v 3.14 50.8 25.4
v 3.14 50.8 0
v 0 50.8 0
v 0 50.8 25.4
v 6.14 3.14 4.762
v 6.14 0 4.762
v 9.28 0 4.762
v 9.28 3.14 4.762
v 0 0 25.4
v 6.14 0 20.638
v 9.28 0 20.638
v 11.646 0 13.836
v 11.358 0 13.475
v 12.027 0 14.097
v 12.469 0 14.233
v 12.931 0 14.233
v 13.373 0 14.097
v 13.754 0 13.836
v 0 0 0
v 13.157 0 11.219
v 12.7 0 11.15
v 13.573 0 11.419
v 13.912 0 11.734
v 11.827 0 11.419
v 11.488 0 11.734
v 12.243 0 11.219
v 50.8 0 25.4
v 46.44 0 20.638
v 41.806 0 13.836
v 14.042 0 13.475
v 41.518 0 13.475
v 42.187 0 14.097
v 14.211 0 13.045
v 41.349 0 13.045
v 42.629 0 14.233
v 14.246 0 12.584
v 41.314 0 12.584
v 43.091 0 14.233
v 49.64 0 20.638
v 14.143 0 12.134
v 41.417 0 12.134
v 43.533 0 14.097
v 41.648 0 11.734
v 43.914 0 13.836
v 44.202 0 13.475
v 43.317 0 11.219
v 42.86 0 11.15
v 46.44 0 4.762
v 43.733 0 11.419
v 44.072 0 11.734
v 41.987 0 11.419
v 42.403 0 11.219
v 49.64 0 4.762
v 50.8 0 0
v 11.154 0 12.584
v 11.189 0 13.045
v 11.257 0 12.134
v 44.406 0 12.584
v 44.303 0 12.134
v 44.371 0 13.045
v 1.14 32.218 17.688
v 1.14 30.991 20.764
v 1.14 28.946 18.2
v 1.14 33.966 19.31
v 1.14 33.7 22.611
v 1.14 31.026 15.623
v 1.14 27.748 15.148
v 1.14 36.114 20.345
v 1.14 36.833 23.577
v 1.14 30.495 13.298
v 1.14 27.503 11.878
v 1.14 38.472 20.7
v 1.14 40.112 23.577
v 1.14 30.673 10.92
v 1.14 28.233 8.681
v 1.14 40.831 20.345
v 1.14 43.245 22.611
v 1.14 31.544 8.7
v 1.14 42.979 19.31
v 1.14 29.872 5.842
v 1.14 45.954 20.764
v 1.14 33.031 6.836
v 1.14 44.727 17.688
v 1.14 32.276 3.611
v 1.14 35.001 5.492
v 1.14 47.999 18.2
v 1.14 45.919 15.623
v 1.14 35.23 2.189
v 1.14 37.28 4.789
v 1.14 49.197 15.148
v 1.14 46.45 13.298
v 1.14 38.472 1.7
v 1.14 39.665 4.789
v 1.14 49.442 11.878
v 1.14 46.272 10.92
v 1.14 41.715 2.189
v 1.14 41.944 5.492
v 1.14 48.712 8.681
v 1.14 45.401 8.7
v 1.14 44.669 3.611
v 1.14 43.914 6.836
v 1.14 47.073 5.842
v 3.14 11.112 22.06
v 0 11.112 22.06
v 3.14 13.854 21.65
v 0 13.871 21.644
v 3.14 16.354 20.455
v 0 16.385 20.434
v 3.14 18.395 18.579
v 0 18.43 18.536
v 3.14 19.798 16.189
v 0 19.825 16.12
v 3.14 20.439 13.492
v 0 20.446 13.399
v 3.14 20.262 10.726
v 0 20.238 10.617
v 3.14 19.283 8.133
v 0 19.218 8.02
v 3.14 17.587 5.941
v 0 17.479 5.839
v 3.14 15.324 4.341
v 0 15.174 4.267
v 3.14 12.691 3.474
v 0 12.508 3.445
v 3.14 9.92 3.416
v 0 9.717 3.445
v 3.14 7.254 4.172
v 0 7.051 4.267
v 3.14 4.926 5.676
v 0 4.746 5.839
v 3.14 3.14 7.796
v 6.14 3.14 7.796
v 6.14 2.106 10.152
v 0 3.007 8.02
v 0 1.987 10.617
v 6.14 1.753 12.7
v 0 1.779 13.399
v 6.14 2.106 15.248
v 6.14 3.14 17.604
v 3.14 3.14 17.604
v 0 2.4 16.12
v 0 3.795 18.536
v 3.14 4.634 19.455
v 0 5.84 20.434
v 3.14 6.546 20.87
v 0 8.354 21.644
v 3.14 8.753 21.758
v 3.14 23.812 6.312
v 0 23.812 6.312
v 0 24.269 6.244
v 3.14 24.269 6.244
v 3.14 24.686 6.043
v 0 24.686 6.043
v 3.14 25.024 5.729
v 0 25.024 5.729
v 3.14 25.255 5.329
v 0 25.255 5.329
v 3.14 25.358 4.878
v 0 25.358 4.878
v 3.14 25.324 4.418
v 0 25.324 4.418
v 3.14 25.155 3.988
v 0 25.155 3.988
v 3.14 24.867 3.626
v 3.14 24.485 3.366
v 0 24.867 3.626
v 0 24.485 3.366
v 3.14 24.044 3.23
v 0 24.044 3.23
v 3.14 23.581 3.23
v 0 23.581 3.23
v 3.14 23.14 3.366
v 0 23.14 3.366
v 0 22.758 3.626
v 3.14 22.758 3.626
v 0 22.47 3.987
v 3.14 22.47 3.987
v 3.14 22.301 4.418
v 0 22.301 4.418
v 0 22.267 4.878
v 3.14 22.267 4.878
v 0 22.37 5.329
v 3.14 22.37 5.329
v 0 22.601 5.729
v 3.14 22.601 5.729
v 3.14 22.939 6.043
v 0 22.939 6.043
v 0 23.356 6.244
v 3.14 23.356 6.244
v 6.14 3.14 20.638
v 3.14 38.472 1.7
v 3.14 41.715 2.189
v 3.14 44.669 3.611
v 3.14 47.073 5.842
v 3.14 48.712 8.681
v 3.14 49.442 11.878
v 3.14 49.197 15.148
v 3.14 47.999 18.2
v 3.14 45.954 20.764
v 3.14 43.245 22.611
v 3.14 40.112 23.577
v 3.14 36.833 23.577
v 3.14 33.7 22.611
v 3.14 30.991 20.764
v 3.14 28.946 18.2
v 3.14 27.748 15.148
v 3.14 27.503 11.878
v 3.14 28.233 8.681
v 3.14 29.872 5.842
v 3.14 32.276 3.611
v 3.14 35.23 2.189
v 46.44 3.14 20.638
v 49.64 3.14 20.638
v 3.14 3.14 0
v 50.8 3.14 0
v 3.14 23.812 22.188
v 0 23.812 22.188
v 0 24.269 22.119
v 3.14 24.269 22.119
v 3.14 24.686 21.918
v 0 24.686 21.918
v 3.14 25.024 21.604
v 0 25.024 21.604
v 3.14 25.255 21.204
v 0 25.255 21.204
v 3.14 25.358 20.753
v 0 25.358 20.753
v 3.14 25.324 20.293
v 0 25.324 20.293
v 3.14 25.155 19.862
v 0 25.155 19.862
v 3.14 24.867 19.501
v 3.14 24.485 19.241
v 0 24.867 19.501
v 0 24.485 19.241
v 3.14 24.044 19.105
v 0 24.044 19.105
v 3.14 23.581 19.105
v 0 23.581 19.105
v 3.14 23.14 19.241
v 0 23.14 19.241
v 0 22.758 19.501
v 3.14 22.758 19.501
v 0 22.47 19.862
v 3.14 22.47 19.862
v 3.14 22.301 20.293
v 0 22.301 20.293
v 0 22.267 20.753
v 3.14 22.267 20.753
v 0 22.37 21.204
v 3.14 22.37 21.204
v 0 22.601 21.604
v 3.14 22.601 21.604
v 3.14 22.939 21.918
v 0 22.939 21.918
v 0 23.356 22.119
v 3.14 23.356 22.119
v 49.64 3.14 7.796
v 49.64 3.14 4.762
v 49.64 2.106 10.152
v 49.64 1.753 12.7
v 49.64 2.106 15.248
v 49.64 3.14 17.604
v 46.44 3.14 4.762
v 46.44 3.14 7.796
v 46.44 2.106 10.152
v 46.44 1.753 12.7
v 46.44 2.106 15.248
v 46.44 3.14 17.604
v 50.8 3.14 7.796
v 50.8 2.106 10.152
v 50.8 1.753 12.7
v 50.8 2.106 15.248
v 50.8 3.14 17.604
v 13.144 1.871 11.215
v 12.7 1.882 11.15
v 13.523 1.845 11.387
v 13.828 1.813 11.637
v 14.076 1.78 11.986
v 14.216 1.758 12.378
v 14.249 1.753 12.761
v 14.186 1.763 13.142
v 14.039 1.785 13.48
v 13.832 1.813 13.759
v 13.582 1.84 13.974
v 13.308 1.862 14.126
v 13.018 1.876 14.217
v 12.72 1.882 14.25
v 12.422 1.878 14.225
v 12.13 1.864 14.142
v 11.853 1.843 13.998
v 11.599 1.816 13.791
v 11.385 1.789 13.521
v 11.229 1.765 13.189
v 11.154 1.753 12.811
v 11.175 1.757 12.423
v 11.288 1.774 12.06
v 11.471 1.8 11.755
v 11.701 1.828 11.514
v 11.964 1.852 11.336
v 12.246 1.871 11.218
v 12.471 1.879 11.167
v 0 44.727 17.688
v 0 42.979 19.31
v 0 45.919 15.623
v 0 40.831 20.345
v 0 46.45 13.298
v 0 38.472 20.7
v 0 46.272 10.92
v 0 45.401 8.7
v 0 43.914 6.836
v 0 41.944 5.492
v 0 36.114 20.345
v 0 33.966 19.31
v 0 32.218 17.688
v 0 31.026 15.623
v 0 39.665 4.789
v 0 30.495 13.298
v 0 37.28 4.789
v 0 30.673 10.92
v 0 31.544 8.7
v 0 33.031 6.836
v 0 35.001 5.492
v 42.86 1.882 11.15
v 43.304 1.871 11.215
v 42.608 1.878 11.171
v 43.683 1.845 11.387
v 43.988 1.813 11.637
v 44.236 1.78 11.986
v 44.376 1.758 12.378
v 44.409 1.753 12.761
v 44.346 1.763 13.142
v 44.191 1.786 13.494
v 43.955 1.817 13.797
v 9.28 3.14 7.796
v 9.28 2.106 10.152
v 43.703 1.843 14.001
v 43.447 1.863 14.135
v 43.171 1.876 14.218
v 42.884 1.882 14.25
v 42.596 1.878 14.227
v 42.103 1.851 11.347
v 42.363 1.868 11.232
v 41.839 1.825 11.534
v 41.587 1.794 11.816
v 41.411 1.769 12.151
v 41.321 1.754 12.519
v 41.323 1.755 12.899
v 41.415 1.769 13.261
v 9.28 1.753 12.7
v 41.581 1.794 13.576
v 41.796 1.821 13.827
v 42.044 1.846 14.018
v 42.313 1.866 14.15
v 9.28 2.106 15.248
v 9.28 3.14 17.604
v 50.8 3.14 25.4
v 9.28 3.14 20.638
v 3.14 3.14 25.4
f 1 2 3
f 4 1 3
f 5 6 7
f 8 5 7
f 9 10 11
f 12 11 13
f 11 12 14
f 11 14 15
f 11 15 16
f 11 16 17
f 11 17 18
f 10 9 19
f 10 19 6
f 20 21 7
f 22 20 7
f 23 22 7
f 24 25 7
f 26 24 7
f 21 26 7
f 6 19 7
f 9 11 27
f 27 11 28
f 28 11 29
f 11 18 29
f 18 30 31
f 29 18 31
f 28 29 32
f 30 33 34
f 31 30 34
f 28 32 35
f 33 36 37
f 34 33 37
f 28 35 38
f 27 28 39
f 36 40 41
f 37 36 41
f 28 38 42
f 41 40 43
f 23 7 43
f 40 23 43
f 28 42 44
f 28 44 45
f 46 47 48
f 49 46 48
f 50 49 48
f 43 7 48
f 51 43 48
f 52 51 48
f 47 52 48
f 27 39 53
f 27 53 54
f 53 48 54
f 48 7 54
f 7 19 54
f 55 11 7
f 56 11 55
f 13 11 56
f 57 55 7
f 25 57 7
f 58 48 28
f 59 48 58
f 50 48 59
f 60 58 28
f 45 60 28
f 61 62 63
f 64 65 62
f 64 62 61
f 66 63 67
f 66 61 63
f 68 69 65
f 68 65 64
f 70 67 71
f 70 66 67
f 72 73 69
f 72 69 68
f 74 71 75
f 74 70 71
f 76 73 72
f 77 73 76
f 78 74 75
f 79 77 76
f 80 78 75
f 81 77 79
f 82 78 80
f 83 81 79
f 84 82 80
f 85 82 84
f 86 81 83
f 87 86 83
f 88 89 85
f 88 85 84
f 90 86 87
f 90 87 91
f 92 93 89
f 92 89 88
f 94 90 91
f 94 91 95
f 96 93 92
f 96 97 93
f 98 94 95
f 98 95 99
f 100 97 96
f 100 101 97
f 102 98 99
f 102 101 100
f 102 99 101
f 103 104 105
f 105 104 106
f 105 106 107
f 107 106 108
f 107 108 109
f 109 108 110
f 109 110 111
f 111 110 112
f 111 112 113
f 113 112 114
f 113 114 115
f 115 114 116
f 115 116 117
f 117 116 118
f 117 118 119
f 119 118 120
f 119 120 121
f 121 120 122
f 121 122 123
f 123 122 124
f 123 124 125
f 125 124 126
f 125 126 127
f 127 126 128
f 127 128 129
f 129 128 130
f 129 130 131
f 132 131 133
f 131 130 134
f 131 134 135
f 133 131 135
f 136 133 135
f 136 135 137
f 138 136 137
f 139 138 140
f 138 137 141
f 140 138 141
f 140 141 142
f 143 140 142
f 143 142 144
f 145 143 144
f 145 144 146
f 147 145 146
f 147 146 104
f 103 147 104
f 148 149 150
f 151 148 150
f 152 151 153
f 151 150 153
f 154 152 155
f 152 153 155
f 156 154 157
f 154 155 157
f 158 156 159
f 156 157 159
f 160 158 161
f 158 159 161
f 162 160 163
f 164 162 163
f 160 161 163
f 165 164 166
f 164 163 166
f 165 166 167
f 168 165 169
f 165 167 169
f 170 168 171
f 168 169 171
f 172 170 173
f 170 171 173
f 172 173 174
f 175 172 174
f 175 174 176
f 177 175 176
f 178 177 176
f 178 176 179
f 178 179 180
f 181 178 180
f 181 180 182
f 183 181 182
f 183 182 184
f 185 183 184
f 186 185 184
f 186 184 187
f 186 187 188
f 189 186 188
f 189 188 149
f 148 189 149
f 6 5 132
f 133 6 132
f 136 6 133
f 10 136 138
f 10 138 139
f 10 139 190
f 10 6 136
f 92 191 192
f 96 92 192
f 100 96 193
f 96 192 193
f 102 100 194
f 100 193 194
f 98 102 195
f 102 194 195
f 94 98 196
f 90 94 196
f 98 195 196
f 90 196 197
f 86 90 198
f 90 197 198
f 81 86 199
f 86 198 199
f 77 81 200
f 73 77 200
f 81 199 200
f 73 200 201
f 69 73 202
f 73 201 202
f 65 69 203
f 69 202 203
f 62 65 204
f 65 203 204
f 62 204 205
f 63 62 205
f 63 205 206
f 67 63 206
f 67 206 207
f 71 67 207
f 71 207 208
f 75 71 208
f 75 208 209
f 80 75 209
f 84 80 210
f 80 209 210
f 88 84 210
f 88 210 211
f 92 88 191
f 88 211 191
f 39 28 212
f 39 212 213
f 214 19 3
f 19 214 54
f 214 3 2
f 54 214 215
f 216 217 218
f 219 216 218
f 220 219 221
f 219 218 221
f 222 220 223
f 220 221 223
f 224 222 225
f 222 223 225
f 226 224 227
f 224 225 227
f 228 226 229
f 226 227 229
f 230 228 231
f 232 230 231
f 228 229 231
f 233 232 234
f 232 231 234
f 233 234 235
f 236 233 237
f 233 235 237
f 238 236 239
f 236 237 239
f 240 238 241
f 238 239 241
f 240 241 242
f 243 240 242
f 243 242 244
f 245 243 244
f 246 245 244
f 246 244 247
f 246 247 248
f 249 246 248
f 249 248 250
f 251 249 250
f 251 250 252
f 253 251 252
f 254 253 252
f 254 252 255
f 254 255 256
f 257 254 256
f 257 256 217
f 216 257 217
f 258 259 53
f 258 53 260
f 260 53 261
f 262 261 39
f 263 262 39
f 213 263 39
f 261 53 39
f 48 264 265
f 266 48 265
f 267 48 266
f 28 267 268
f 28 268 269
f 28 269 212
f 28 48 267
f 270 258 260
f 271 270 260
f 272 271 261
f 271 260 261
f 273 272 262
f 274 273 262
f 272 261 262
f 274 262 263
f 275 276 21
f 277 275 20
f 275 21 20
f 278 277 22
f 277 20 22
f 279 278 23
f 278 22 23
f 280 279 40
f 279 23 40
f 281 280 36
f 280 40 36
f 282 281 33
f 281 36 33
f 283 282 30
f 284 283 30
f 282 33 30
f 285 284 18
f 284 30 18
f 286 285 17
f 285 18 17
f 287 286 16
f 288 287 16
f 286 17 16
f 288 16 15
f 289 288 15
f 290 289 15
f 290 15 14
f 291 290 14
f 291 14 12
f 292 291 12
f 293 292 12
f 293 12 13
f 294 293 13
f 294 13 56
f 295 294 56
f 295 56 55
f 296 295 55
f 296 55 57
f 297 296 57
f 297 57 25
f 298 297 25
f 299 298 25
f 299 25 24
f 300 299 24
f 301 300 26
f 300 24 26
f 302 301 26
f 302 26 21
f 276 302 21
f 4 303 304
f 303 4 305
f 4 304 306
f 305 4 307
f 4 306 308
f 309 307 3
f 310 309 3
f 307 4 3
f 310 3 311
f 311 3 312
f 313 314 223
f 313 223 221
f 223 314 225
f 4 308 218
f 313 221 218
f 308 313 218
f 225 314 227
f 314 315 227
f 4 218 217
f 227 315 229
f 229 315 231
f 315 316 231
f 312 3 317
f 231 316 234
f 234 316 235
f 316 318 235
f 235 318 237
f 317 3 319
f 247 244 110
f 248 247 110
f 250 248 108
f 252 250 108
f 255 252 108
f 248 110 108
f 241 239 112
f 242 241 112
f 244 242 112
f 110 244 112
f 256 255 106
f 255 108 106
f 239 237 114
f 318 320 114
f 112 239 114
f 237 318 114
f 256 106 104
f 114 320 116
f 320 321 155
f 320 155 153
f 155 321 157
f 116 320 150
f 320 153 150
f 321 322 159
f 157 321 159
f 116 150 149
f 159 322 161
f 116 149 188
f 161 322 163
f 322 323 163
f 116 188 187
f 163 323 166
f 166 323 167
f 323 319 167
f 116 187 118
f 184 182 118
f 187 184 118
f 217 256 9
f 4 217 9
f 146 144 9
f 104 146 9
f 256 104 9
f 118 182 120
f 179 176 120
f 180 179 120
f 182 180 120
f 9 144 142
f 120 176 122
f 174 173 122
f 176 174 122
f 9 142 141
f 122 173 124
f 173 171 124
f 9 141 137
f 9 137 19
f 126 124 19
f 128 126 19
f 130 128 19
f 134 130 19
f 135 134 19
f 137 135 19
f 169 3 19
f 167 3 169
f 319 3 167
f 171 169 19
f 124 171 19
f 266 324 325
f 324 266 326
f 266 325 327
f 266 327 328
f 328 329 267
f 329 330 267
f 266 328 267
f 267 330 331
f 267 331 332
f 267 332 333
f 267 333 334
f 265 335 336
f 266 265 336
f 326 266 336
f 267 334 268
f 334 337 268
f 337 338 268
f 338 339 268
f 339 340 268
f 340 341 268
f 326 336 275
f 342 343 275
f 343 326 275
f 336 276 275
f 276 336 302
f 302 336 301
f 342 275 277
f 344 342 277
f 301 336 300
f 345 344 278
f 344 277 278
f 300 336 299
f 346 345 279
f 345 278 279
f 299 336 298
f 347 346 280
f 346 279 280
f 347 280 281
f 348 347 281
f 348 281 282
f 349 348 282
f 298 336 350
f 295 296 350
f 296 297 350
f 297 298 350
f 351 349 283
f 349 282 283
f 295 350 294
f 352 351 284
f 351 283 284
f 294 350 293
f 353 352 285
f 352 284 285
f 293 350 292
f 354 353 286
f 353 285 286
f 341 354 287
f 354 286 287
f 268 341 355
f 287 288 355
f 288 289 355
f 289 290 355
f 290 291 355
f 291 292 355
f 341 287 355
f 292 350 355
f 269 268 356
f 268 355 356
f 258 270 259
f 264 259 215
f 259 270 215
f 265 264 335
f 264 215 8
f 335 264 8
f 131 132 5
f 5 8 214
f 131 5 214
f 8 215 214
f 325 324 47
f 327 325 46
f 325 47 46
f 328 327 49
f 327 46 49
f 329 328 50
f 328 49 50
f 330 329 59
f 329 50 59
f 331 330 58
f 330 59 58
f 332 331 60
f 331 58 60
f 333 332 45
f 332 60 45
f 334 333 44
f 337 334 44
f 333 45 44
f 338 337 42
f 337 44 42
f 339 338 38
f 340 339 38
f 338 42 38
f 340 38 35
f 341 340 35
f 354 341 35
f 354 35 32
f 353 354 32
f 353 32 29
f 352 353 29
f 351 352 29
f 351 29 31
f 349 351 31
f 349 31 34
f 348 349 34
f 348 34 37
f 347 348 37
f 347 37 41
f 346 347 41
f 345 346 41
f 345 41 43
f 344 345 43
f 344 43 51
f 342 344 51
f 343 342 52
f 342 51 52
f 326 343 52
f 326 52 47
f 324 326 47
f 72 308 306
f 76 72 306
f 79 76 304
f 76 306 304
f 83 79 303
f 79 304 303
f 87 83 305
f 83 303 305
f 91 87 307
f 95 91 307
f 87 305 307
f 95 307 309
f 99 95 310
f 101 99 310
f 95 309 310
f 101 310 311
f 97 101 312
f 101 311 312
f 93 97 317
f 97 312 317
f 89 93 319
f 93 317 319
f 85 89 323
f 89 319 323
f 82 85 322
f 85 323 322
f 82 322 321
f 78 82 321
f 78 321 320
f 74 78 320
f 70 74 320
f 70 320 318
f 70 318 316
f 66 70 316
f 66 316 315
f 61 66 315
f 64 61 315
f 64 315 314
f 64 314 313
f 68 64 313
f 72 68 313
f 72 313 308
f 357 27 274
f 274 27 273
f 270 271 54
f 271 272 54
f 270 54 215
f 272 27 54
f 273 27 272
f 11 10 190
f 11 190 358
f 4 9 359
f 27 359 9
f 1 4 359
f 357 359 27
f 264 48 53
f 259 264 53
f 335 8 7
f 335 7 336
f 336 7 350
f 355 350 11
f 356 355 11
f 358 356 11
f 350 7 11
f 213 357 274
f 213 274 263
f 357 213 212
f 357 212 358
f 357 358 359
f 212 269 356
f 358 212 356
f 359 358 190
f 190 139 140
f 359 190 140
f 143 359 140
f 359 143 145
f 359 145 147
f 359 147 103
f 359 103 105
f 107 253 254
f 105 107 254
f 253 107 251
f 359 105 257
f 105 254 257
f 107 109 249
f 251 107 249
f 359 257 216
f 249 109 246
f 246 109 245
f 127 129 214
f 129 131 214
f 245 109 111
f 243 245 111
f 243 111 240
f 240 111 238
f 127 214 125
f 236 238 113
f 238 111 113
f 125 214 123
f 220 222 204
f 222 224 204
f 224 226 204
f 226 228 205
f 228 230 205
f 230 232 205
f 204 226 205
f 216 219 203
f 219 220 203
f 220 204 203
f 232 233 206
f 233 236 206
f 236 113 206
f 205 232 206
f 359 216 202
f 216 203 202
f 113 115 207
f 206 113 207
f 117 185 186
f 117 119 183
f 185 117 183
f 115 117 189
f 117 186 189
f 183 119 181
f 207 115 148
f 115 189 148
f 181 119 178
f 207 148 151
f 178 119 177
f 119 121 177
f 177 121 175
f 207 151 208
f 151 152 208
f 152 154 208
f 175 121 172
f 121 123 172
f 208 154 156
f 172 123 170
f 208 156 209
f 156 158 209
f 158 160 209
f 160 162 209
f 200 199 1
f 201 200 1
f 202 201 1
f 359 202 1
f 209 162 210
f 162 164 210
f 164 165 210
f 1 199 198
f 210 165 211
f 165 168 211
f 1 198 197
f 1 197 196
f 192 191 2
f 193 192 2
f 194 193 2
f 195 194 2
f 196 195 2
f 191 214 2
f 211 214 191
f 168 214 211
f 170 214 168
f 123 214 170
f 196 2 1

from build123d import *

# Parameters (mm, degrees)
EXTRUDE1_DEPTH     = 25.4
SKETCH2_R          = 9.36
SKETCH2_R_2        = 8
SKETCH2_R_3        = 1.55
CUT_EXTRUDE1_DEPTH = 77.2
SKETCH3_R          = 11
CUT_EXTRUDE2_DEPTH = 2
SKETCH4_R          = 1.55
SKETCH4_W          = 3.14
SKETCH4_H          = 15.875
SKETCH4_W_2        = 3.2
CUT_EXTRUDE3_DEPTH = 77.2


with BuildPart() as part:
    # Sketch1 → Extrude1 (new body)
    with BuildSketch(Plane.XY):
        Polygon((0, 0), (50.8, 0), (50.8, 3.14), (3.14, 3.14), (3.14, 50.8), (0, 50.8), align=None)
    extrude(amount=EXTRUDE1_DEPTH)

    # Sketch2 → Cut-Extrude1 (cut, through all)
    with BuildSketch(Plane.ZY):
        with Locations((12.7, 11.1125)):
            Circle(SKETCH2_R)
        with Locations((12.7, 38.4725)):
            Circle(SKETCH2_R_2)
        with Locations((4.7625, 23.8125)):
            Circle(SKETCH2_R_3)
        with Locations((20.6375, 23.8125)):
            Circle(SKETCH2_R_3)
    extrude(amount=-CUT_EXTRUDE1_DEPTH, mode=Mode.SUBTRACT)

    # Sketch3 → Cut-Extrude2 (cut)
    with BuildSketch(Plane(origin=(3.14, 0, 0), x_dir=(0, 0, -1), z_dir=(1, 0, 0))):
        with Locations((-12.7, 38.4725)):
            Circle(SKETCH3_R)
    extrude(amount=-CUT_EXTRUDE2_DEPTH, mode=Mode.SUBTRACT)

    # Sketch4 → Cut-Extrude3 (cut, through all)
    with BuildSketch(Plane.XZ):
        with Locations(Location((12.7, 12.7, 0), (0, 0, 270))):
            Circle(SKETCH4_R)
        with Locations(Location((42.86, 12.7, 0), (0, 0, 270))):
            Circle(SKETCH4_R)
        with Locations((7.71, 12.7)):
            Rectangle(SKETCH4_W, SKETCH4_H)
        with Locations((48.04, 12.7)):
            Rectangle(SKETCH4_W_2, SKETCH4_H)
    extrude(amount=-CUT_EXTRUDE3_DEPTH, mode=Mode.SUBTRACT)


solid = part.part
